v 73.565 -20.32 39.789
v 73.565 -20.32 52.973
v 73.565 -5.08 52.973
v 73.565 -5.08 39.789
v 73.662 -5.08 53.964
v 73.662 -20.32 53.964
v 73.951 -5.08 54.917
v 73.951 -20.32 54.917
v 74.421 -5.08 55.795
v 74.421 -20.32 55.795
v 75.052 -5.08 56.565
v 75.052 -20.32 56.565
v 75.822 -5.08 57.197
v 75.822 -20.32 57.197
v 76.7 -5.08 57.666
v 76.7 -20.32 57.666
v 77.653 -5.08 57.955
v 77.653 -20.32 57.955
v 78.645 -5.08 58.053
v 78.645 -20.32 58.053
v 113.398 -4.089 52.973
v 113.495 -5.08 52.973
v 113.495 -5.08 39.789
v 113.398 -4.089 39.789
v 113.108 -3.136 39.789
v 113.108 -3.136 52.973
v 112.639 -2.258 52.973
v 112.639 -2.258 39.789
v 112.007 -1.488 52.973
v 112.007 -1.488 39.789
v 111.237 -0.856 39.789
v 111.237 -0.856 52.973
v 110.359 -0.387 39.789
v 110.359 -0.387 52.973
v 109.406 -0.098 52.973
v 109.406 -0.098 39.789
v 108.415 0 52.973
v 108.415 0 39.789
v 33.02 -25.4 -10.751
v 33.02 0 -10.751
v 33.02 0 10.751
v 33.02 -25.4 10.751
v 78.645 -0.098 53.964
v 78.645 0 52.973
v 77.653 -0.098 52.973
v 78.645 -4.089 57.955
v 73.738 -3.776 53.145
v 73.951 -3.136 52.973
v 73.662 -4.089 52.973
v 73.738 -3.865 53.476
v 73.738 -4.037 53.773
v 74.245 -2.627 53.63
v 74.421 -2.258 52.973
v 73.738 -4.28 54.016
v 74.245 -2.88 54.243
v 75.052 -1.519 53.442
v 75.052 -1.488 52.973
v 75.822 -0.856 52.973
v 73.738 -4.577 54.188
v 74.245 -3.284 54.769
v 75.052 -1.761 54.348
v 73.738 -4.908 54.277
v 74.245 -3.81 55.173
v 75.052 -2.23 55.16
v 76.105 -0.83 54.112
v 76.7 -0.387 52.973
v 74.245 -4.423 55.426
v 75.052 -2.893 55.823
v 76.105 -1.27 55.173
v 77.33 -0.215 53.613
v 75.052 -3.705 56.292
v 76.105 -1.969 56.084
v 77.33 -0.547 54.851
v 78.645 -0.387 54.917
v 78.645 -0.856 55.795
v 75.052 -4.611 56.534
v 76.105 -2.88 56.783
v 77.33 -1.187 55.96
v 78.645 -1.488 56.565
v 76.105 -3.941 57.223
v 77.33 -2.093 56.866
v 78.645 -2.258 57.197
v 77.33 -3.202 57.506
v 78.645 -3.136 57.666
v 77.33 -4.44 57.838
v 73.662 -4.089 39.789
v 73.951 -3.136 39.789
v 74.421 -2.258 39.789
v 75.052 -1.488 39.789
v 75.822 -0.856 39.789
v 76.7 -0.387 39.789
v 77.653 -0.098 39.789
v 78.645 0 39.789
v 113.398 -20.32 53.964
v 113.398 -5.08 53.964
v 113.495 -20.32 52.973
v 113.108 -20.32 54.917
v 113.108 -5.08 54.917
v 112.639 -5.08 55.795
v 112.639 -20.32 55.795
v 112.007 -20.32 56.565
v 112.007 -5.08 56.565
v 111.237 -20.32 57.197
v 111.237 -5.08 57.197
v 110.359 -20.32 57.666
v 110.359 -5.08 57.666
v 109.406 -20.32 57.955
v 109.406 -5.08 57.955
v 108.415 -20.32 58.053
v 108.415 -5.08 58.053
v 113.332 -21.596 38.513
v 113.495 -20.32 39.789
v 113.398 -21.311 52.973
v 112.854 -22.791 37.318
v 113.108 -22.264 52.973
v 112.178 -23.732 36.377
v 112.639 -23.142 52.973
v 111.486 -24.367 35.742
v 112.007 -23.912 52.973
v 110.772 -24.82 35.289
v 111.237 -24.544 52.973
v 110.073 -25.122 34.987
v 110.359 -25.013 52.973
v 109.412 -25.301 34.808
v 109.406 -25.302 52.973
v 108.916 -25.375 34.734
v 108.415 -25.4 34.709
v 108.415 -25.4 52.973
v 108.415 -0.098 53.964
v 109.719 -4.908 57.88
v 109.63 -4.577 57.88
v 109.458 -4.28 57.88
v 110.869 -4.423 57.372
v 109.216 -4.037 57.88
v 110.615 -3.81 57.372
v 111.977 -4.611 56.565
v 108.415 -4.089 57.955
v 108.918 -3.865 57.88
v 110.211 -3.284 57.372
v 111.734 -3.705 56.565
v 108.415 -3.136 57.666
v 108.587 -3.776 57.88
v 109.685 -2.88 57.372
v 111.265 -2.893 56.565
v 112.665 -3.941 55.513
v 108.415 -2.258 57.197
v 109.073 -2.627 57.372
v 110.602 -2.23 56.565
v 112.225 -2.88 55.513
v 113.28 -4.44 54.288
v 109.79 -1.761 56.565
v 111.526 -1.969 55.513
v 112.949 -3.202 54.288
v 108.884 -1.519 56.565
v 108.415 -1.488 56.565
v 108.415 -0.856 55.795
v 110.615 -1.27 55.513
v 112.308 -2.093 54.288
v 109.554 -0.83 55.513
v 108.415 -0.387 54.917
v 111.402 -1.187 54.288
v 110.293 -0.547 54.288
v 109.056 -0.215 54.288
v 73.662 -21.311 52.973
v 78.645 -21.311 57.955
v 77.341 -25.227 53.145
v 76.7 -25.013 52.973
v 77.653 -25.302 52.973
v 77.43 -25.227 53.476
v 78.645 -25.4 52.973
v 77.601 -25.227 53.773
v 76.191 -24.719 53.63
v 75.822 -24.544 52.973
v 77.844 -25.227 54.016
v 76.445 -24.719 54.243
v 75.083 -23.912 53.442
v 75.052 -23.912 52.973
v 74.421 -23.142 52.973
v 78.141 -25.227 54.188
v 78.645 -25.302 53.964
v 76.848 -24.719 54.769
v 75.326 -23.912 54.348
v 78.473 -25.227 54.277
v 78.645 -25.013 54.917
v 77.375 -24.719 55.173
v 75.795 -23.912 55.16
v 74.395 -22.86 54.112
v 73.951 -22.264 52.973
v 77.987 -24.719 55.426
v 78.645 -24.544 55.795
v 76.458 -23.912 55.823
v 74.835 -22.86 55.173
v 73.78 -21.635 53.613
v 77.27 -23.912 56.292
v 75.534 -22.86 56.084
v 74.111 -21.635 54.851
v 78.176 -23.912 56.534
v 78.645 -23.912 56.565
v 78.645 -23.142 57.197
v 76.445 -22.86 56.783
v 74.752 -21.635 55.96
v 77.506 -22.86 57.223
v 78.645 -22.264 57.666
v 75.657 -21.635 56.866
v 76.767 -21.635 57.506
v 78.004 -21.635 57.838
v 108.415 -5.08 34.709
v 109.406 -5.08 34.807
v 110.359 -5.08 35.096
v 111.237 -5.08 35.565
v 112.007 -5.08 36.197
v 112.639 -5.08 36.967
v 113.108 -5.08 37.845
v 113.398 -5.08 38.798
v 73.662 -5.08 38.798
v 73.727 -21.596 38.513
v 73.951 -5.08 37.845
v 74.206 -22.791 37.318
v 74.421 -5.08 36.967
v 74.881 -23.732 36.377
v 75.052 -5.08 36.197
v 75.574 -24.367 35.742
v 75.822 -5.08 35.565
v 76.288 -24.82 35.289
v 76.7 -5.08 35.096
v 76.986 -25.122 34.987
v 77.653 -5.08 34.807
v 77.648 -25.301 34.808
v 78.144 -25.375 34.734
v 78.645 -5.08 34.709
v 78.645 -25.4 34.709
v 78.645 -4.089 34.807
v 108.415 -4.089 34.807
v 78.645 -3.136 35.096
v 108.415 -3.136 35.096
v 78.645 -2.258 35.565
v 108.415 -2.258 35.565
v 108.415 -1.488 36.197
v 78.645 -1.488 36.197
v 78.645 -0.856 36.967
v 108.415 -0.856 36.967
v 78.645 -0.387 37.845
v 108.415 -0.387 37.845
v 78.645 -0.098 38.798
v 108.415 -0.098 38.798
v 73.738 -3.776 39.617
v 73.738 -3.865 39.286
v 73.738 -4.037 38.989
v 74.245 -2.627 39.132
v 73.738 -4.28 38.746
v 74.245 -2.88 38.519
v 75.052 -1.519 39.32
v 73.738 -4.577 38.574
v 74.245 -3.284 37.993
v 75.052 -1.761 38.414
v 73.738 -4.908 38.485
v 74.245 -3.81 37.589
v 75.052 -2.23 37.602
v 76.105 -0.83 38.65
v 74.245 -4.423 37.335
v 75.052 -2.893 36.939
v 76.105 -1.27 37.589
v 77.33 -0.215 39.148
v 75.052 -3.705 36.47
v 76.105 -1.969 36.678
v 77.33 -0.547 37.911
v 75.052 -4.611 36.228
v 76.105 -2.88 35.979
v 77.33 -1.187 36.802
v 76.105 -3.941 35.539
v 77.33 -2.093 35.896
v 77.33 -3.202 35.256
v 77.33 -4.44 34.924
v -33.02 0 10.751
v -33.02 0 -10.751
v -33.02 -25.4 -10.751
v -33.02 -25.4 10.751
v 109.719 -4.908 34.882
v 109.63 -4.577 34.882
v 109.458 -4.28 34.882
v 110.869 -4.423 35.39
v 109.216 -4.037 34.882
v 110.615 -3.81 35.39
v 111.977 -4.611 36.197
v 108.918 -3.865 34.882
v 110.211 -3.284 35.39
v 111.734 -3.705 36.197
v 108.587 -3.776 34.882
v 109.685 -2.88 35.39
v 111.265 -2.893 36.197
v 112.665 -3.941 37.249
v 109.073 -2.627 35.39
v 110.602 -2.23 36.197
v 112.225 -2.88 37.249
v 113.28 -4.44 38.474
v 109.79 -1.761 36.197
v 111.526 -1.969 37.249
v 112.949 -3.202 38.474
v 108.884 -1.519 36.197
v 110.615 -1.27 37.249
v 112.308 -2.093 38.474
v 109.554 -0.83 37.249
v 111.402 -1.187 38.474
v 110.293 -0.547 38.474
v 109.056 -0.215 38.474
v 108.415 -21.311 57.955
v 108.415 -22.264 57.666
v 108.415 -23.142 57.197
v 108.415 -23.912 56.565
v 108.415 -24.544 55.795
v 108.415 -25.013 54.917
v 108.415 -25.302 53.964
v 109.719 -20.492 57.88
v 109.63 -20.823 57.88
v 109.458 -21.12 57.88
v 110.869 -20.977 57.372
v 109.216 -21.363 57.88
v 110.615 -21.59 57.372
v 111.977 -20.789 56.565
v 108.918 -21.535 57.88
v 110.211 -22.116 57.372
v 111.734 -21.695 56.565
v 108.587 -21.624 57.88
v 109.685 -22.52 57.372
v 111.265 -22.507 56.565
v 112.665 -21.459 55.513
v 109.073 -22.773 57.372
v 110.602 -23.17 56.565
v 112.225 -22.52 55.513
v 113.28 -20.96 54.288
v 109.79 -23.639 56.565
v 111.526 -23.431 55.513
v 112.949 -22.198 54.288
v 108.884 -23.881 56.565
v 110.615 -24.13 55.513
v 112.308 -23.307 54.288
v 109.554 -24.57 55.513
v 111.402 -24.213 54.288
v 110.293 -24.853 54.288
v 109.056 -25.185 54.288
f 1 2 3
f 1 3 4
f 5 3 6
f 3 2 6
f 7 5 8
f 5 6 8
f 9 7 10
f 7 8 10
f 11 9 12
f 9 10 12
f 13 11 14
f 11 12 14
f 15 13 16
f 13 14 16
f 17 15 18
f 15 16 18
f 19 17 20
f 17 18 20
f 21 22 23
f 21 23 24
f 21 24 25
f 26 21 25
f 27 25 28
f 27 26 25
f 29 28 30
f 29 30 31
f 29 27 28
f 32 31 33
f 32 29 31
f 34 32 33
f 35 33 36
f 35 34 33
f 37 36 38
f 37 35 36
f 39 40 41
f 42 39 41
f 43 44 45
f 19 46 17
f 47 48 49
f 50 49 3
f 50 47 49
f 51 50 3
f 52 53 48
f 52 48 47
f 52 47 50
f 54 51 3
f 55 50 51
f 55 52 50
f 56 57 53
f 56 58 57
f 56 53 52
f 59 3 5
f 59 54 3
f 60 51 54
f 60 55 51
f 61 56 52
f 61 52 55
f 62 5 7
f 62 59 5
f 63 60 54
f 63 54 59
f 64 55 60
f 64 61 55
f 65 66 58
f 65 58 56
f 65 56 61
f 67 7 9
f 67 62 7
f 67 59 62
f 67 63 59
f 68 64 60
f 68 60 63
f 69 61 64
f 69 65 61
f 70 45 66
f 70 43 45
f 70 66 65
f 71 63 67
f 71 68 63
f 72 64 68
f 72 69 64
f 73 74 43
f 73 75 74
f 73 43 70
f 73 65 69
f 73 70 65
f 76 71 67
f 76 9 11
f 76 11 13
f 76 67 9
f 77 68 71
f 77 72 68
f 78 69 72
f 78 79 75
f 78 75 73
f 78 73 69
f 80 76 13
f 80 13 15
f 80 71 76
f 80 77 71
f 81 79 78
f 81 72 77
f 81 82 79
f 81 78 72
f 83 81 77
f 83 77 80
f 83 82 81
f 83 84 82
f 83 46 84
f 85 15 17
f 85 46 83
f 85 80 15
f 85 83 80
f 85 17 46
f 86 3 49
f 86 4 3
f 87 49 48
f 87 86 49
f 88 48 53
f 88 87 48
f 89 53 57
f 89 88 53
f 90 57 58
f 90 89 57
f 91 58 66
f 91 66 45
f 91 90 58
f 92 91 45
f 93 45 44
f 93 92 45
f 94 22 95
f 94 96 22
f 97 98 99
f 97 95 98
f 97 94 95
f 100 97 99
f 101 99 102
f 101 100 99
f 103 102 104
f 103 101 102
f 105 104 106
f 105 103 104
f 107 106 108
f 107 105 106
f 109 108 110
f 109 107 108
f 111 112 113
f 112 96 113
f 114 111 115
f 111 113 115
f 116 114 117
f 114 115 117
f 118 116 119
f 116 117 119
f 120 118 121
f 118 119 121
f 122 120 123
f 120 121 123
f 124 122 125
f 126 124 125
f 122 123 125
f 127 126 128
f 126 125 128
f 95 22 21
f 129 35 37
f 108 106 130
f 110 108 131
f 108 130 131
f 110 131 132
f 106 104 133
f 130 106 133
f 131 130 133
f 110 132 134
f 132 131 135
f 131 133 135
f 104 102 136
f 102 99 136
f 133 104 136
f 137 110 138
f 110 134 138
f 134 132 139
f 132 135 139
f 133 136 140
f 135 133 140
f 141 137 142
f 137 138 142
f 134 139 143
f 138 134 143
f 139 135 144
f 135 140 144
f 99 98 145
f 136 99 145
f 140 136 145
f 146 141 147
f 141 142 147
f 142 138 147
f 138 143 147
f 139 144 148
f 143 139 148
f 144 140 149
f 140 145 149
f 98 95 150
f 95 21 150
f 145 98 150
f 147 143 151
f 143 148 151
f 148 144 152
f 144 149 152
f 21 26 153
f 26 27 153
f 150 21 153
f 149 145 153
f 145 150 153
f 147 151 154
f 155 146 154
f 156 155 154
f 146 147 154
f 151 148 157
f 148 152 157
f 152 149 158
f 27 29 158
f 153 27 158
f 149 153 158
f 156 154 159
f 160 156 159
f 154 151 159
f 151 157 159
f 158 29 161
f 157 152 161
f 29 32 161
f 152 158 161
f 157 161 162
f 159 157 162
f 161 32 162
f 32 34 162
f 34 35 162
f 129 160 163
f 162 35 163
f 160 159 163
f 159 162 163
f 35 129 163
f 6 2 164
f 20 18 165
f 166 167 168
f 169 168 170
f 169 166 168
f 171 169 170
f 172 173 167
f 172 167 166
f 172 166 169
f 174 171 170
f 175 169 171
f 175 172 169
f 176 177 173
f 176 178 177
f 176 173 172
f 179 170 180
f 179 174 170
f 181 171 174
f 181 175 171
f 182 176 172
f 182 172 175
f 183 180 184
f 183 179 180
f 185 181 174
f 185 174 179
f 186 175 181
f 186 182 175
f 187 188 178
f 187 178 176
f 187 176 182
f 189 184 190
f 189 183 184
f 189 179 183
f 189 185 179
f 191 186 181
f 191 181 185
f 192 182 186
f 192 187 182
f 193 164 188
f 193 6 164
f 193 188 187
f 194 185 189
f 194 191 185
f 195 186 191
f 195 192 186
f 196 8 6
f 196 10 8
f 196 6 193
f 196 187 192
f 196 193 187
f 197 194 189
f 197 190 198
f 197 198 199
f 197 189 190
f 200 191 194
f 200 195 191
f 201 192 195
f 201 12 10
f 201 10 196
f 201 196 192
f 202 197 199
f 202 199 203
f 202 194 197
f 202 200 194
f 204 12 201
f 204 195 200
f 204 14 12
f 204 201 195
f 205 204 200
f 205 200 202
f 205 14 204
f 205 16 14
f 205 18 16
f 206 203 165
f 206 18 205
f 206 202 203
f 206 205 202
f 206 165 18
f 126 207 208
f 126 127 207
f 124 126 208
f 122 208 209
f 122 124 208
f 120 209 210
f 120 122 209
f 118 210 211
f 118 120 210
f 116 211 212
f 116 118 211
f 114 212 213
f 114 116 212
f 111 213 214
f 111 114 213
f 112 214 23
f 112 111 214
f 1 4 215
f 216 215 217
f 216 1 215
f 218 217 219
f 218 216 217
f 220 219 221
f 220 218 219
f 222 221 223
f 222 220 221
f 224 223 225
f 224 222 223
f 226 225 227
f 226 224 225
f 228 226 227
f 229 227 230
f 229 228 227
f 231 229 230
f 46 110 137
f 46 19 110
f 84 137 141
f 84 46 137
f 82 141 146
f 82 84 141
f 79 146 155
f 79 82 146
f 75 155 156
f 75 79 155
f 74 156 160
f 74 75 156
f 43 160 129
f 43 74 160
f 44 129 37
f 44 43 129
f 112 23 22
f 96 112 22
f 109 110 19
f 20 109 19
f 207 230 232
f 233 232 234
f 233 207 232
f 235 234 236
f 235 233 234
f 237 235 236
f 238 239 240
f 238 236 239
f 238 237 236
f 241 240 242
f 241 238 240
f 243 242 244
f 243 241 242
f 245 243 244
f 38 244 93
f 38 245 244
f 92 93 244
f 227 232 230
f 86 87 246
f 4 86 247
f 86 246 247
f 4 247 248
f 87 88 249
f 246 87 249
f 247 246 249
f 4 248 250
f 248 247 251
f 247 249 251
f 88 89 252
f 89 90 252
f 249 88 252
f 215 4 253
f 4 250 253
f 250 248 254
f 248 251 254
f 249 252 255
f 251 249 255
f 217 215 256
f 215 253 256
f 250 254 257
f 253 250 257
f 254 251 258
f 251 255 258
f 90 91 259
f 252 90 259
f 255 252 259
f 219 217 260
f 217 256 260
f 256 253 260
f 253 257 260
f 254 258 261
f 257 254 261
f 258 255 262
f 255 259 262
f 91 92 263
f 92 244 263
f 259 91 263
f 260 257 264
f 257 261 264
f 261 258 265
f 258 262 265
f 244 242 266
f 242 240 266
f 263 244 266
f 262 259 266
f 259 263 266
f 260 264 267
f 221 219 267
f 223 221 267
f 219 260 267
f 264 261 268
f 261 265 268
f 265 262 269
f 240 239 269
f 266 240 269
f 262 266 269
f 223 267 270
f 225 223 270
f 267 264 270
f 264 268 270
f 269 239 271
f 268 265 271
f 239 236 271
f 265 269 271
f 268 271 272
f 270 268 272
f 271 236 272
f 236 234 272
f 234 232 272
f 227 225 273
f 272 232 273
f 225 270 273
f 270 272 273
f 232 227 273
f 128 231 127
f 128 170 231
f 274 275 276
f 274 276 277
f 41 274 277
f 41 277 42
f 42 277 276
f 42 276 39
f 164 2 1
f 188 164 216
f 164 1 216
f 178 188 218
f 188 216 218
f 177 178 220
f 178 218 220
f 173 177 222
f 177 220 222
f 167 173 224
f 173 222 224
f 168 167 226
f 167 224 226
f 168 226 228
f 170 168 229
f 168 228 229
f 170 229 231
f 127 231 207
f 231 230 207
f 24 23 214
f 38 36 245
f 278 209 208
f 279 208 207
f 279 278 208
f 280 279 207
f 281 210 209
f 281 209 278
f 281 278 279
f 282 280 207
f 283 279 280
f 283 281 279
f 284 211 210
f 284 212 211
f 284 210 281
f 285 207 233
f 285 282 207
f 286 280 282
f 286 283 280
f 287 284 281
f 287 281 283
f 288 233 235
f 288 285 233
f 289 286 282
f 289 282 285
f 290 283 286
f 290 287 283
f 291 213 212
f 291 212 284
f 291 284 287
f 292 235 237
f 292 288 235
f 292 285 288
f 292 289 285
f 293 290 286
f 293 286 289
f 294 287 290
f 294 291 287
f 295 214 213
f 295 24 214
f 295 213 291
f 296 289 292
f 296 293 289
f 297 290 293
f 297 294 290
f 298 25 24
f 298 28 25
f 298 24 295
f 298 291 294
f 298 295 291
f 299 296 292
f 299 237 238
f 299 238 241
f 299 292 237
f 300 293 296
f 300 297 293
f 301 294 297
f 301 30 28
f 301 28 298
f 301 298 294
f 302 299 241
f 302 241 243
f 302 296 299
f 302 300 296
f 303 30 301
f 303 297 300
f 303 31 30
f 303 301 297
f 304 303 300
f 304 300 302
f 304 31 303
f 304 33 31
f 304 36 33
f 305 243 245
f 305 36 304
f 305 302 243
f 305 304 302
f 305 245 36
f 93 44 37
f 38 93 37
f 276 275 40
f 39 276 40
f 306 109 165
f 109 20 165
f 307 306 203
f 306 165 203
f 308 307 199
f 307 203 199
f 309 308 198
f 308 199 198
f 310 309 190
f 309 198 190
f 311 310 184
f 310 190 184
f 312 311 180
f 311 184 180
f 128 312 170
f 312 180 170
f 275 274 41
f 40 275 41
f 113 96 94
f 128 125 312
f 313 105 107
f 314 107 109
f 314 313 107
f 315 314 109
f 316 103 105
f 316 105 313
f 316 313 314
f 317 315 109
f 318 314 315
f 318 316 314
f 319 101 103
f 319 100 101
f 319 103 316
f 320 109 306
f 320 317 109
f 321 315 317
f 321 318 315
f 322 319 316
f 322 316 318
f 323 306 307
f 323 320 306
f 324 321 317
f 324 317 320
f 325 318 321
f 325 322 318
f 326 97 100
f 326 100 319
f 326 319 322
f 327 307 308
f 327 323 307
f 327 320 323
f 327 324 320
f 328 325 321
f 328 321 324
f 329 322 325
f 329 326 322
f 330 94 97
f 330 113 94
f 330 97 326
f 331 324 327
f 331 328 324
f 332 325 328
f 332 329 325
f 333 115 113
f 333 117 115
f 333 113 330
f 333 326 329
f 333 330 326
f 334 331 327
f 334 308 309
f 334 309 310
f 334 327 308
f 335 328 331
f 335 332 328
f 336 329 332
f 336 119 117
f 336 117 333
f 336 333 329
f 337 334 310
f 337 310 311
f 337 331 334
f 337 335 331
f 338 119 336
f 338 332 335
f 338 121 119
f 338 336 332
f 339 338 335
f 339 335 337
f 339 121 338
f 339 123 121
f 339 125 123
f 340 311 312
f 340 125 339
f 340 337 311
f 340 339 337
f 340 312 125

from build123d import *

# Parameters (mm, degrees)
F0_W     = 66.039116
F0_H     = 21.501114
F1_DEPTH = 25.4
F2_R     = 5.08


with BuildPart() as f1:
    # F0 (on Front) → F1 (new body)
    with BuildSketch(Plane.XZ):
        Rectangle(F0_W, F0_H)
        Polygon((73.564515, 58.052998), (73.564515, 39.100903), (73.564515, 34.708936), (113.495141, 34.708936), (113.495141, 58.052998), align=None)
    extrude(amount=F1_DEPTH)

    # F2
    f2_edges = [f1.edges().sort_by_distance(p)[0] for p in [
        (113.495141, 0, 46.380967),
        (113.495141, -25.4, 46.380967),
        (113.495141, -12.7, 34.708936),
        (113.495141, -12.7, 58.052998),
        (93.529828, 0, 58.052998),
        (93.529828, 0, 34.708936),
        (73.564515, 0, 46.380967),
        (73.564515, -12.7, 58.052998),
        (73.564515, -25.4, 46.380967),
        (73.564515, -12.7, 34.708936),
        (93.529828, -25.4, 58.052998),
    ]]
    fillet(f2_edges, radius=F2_R)


solid = f1.part
